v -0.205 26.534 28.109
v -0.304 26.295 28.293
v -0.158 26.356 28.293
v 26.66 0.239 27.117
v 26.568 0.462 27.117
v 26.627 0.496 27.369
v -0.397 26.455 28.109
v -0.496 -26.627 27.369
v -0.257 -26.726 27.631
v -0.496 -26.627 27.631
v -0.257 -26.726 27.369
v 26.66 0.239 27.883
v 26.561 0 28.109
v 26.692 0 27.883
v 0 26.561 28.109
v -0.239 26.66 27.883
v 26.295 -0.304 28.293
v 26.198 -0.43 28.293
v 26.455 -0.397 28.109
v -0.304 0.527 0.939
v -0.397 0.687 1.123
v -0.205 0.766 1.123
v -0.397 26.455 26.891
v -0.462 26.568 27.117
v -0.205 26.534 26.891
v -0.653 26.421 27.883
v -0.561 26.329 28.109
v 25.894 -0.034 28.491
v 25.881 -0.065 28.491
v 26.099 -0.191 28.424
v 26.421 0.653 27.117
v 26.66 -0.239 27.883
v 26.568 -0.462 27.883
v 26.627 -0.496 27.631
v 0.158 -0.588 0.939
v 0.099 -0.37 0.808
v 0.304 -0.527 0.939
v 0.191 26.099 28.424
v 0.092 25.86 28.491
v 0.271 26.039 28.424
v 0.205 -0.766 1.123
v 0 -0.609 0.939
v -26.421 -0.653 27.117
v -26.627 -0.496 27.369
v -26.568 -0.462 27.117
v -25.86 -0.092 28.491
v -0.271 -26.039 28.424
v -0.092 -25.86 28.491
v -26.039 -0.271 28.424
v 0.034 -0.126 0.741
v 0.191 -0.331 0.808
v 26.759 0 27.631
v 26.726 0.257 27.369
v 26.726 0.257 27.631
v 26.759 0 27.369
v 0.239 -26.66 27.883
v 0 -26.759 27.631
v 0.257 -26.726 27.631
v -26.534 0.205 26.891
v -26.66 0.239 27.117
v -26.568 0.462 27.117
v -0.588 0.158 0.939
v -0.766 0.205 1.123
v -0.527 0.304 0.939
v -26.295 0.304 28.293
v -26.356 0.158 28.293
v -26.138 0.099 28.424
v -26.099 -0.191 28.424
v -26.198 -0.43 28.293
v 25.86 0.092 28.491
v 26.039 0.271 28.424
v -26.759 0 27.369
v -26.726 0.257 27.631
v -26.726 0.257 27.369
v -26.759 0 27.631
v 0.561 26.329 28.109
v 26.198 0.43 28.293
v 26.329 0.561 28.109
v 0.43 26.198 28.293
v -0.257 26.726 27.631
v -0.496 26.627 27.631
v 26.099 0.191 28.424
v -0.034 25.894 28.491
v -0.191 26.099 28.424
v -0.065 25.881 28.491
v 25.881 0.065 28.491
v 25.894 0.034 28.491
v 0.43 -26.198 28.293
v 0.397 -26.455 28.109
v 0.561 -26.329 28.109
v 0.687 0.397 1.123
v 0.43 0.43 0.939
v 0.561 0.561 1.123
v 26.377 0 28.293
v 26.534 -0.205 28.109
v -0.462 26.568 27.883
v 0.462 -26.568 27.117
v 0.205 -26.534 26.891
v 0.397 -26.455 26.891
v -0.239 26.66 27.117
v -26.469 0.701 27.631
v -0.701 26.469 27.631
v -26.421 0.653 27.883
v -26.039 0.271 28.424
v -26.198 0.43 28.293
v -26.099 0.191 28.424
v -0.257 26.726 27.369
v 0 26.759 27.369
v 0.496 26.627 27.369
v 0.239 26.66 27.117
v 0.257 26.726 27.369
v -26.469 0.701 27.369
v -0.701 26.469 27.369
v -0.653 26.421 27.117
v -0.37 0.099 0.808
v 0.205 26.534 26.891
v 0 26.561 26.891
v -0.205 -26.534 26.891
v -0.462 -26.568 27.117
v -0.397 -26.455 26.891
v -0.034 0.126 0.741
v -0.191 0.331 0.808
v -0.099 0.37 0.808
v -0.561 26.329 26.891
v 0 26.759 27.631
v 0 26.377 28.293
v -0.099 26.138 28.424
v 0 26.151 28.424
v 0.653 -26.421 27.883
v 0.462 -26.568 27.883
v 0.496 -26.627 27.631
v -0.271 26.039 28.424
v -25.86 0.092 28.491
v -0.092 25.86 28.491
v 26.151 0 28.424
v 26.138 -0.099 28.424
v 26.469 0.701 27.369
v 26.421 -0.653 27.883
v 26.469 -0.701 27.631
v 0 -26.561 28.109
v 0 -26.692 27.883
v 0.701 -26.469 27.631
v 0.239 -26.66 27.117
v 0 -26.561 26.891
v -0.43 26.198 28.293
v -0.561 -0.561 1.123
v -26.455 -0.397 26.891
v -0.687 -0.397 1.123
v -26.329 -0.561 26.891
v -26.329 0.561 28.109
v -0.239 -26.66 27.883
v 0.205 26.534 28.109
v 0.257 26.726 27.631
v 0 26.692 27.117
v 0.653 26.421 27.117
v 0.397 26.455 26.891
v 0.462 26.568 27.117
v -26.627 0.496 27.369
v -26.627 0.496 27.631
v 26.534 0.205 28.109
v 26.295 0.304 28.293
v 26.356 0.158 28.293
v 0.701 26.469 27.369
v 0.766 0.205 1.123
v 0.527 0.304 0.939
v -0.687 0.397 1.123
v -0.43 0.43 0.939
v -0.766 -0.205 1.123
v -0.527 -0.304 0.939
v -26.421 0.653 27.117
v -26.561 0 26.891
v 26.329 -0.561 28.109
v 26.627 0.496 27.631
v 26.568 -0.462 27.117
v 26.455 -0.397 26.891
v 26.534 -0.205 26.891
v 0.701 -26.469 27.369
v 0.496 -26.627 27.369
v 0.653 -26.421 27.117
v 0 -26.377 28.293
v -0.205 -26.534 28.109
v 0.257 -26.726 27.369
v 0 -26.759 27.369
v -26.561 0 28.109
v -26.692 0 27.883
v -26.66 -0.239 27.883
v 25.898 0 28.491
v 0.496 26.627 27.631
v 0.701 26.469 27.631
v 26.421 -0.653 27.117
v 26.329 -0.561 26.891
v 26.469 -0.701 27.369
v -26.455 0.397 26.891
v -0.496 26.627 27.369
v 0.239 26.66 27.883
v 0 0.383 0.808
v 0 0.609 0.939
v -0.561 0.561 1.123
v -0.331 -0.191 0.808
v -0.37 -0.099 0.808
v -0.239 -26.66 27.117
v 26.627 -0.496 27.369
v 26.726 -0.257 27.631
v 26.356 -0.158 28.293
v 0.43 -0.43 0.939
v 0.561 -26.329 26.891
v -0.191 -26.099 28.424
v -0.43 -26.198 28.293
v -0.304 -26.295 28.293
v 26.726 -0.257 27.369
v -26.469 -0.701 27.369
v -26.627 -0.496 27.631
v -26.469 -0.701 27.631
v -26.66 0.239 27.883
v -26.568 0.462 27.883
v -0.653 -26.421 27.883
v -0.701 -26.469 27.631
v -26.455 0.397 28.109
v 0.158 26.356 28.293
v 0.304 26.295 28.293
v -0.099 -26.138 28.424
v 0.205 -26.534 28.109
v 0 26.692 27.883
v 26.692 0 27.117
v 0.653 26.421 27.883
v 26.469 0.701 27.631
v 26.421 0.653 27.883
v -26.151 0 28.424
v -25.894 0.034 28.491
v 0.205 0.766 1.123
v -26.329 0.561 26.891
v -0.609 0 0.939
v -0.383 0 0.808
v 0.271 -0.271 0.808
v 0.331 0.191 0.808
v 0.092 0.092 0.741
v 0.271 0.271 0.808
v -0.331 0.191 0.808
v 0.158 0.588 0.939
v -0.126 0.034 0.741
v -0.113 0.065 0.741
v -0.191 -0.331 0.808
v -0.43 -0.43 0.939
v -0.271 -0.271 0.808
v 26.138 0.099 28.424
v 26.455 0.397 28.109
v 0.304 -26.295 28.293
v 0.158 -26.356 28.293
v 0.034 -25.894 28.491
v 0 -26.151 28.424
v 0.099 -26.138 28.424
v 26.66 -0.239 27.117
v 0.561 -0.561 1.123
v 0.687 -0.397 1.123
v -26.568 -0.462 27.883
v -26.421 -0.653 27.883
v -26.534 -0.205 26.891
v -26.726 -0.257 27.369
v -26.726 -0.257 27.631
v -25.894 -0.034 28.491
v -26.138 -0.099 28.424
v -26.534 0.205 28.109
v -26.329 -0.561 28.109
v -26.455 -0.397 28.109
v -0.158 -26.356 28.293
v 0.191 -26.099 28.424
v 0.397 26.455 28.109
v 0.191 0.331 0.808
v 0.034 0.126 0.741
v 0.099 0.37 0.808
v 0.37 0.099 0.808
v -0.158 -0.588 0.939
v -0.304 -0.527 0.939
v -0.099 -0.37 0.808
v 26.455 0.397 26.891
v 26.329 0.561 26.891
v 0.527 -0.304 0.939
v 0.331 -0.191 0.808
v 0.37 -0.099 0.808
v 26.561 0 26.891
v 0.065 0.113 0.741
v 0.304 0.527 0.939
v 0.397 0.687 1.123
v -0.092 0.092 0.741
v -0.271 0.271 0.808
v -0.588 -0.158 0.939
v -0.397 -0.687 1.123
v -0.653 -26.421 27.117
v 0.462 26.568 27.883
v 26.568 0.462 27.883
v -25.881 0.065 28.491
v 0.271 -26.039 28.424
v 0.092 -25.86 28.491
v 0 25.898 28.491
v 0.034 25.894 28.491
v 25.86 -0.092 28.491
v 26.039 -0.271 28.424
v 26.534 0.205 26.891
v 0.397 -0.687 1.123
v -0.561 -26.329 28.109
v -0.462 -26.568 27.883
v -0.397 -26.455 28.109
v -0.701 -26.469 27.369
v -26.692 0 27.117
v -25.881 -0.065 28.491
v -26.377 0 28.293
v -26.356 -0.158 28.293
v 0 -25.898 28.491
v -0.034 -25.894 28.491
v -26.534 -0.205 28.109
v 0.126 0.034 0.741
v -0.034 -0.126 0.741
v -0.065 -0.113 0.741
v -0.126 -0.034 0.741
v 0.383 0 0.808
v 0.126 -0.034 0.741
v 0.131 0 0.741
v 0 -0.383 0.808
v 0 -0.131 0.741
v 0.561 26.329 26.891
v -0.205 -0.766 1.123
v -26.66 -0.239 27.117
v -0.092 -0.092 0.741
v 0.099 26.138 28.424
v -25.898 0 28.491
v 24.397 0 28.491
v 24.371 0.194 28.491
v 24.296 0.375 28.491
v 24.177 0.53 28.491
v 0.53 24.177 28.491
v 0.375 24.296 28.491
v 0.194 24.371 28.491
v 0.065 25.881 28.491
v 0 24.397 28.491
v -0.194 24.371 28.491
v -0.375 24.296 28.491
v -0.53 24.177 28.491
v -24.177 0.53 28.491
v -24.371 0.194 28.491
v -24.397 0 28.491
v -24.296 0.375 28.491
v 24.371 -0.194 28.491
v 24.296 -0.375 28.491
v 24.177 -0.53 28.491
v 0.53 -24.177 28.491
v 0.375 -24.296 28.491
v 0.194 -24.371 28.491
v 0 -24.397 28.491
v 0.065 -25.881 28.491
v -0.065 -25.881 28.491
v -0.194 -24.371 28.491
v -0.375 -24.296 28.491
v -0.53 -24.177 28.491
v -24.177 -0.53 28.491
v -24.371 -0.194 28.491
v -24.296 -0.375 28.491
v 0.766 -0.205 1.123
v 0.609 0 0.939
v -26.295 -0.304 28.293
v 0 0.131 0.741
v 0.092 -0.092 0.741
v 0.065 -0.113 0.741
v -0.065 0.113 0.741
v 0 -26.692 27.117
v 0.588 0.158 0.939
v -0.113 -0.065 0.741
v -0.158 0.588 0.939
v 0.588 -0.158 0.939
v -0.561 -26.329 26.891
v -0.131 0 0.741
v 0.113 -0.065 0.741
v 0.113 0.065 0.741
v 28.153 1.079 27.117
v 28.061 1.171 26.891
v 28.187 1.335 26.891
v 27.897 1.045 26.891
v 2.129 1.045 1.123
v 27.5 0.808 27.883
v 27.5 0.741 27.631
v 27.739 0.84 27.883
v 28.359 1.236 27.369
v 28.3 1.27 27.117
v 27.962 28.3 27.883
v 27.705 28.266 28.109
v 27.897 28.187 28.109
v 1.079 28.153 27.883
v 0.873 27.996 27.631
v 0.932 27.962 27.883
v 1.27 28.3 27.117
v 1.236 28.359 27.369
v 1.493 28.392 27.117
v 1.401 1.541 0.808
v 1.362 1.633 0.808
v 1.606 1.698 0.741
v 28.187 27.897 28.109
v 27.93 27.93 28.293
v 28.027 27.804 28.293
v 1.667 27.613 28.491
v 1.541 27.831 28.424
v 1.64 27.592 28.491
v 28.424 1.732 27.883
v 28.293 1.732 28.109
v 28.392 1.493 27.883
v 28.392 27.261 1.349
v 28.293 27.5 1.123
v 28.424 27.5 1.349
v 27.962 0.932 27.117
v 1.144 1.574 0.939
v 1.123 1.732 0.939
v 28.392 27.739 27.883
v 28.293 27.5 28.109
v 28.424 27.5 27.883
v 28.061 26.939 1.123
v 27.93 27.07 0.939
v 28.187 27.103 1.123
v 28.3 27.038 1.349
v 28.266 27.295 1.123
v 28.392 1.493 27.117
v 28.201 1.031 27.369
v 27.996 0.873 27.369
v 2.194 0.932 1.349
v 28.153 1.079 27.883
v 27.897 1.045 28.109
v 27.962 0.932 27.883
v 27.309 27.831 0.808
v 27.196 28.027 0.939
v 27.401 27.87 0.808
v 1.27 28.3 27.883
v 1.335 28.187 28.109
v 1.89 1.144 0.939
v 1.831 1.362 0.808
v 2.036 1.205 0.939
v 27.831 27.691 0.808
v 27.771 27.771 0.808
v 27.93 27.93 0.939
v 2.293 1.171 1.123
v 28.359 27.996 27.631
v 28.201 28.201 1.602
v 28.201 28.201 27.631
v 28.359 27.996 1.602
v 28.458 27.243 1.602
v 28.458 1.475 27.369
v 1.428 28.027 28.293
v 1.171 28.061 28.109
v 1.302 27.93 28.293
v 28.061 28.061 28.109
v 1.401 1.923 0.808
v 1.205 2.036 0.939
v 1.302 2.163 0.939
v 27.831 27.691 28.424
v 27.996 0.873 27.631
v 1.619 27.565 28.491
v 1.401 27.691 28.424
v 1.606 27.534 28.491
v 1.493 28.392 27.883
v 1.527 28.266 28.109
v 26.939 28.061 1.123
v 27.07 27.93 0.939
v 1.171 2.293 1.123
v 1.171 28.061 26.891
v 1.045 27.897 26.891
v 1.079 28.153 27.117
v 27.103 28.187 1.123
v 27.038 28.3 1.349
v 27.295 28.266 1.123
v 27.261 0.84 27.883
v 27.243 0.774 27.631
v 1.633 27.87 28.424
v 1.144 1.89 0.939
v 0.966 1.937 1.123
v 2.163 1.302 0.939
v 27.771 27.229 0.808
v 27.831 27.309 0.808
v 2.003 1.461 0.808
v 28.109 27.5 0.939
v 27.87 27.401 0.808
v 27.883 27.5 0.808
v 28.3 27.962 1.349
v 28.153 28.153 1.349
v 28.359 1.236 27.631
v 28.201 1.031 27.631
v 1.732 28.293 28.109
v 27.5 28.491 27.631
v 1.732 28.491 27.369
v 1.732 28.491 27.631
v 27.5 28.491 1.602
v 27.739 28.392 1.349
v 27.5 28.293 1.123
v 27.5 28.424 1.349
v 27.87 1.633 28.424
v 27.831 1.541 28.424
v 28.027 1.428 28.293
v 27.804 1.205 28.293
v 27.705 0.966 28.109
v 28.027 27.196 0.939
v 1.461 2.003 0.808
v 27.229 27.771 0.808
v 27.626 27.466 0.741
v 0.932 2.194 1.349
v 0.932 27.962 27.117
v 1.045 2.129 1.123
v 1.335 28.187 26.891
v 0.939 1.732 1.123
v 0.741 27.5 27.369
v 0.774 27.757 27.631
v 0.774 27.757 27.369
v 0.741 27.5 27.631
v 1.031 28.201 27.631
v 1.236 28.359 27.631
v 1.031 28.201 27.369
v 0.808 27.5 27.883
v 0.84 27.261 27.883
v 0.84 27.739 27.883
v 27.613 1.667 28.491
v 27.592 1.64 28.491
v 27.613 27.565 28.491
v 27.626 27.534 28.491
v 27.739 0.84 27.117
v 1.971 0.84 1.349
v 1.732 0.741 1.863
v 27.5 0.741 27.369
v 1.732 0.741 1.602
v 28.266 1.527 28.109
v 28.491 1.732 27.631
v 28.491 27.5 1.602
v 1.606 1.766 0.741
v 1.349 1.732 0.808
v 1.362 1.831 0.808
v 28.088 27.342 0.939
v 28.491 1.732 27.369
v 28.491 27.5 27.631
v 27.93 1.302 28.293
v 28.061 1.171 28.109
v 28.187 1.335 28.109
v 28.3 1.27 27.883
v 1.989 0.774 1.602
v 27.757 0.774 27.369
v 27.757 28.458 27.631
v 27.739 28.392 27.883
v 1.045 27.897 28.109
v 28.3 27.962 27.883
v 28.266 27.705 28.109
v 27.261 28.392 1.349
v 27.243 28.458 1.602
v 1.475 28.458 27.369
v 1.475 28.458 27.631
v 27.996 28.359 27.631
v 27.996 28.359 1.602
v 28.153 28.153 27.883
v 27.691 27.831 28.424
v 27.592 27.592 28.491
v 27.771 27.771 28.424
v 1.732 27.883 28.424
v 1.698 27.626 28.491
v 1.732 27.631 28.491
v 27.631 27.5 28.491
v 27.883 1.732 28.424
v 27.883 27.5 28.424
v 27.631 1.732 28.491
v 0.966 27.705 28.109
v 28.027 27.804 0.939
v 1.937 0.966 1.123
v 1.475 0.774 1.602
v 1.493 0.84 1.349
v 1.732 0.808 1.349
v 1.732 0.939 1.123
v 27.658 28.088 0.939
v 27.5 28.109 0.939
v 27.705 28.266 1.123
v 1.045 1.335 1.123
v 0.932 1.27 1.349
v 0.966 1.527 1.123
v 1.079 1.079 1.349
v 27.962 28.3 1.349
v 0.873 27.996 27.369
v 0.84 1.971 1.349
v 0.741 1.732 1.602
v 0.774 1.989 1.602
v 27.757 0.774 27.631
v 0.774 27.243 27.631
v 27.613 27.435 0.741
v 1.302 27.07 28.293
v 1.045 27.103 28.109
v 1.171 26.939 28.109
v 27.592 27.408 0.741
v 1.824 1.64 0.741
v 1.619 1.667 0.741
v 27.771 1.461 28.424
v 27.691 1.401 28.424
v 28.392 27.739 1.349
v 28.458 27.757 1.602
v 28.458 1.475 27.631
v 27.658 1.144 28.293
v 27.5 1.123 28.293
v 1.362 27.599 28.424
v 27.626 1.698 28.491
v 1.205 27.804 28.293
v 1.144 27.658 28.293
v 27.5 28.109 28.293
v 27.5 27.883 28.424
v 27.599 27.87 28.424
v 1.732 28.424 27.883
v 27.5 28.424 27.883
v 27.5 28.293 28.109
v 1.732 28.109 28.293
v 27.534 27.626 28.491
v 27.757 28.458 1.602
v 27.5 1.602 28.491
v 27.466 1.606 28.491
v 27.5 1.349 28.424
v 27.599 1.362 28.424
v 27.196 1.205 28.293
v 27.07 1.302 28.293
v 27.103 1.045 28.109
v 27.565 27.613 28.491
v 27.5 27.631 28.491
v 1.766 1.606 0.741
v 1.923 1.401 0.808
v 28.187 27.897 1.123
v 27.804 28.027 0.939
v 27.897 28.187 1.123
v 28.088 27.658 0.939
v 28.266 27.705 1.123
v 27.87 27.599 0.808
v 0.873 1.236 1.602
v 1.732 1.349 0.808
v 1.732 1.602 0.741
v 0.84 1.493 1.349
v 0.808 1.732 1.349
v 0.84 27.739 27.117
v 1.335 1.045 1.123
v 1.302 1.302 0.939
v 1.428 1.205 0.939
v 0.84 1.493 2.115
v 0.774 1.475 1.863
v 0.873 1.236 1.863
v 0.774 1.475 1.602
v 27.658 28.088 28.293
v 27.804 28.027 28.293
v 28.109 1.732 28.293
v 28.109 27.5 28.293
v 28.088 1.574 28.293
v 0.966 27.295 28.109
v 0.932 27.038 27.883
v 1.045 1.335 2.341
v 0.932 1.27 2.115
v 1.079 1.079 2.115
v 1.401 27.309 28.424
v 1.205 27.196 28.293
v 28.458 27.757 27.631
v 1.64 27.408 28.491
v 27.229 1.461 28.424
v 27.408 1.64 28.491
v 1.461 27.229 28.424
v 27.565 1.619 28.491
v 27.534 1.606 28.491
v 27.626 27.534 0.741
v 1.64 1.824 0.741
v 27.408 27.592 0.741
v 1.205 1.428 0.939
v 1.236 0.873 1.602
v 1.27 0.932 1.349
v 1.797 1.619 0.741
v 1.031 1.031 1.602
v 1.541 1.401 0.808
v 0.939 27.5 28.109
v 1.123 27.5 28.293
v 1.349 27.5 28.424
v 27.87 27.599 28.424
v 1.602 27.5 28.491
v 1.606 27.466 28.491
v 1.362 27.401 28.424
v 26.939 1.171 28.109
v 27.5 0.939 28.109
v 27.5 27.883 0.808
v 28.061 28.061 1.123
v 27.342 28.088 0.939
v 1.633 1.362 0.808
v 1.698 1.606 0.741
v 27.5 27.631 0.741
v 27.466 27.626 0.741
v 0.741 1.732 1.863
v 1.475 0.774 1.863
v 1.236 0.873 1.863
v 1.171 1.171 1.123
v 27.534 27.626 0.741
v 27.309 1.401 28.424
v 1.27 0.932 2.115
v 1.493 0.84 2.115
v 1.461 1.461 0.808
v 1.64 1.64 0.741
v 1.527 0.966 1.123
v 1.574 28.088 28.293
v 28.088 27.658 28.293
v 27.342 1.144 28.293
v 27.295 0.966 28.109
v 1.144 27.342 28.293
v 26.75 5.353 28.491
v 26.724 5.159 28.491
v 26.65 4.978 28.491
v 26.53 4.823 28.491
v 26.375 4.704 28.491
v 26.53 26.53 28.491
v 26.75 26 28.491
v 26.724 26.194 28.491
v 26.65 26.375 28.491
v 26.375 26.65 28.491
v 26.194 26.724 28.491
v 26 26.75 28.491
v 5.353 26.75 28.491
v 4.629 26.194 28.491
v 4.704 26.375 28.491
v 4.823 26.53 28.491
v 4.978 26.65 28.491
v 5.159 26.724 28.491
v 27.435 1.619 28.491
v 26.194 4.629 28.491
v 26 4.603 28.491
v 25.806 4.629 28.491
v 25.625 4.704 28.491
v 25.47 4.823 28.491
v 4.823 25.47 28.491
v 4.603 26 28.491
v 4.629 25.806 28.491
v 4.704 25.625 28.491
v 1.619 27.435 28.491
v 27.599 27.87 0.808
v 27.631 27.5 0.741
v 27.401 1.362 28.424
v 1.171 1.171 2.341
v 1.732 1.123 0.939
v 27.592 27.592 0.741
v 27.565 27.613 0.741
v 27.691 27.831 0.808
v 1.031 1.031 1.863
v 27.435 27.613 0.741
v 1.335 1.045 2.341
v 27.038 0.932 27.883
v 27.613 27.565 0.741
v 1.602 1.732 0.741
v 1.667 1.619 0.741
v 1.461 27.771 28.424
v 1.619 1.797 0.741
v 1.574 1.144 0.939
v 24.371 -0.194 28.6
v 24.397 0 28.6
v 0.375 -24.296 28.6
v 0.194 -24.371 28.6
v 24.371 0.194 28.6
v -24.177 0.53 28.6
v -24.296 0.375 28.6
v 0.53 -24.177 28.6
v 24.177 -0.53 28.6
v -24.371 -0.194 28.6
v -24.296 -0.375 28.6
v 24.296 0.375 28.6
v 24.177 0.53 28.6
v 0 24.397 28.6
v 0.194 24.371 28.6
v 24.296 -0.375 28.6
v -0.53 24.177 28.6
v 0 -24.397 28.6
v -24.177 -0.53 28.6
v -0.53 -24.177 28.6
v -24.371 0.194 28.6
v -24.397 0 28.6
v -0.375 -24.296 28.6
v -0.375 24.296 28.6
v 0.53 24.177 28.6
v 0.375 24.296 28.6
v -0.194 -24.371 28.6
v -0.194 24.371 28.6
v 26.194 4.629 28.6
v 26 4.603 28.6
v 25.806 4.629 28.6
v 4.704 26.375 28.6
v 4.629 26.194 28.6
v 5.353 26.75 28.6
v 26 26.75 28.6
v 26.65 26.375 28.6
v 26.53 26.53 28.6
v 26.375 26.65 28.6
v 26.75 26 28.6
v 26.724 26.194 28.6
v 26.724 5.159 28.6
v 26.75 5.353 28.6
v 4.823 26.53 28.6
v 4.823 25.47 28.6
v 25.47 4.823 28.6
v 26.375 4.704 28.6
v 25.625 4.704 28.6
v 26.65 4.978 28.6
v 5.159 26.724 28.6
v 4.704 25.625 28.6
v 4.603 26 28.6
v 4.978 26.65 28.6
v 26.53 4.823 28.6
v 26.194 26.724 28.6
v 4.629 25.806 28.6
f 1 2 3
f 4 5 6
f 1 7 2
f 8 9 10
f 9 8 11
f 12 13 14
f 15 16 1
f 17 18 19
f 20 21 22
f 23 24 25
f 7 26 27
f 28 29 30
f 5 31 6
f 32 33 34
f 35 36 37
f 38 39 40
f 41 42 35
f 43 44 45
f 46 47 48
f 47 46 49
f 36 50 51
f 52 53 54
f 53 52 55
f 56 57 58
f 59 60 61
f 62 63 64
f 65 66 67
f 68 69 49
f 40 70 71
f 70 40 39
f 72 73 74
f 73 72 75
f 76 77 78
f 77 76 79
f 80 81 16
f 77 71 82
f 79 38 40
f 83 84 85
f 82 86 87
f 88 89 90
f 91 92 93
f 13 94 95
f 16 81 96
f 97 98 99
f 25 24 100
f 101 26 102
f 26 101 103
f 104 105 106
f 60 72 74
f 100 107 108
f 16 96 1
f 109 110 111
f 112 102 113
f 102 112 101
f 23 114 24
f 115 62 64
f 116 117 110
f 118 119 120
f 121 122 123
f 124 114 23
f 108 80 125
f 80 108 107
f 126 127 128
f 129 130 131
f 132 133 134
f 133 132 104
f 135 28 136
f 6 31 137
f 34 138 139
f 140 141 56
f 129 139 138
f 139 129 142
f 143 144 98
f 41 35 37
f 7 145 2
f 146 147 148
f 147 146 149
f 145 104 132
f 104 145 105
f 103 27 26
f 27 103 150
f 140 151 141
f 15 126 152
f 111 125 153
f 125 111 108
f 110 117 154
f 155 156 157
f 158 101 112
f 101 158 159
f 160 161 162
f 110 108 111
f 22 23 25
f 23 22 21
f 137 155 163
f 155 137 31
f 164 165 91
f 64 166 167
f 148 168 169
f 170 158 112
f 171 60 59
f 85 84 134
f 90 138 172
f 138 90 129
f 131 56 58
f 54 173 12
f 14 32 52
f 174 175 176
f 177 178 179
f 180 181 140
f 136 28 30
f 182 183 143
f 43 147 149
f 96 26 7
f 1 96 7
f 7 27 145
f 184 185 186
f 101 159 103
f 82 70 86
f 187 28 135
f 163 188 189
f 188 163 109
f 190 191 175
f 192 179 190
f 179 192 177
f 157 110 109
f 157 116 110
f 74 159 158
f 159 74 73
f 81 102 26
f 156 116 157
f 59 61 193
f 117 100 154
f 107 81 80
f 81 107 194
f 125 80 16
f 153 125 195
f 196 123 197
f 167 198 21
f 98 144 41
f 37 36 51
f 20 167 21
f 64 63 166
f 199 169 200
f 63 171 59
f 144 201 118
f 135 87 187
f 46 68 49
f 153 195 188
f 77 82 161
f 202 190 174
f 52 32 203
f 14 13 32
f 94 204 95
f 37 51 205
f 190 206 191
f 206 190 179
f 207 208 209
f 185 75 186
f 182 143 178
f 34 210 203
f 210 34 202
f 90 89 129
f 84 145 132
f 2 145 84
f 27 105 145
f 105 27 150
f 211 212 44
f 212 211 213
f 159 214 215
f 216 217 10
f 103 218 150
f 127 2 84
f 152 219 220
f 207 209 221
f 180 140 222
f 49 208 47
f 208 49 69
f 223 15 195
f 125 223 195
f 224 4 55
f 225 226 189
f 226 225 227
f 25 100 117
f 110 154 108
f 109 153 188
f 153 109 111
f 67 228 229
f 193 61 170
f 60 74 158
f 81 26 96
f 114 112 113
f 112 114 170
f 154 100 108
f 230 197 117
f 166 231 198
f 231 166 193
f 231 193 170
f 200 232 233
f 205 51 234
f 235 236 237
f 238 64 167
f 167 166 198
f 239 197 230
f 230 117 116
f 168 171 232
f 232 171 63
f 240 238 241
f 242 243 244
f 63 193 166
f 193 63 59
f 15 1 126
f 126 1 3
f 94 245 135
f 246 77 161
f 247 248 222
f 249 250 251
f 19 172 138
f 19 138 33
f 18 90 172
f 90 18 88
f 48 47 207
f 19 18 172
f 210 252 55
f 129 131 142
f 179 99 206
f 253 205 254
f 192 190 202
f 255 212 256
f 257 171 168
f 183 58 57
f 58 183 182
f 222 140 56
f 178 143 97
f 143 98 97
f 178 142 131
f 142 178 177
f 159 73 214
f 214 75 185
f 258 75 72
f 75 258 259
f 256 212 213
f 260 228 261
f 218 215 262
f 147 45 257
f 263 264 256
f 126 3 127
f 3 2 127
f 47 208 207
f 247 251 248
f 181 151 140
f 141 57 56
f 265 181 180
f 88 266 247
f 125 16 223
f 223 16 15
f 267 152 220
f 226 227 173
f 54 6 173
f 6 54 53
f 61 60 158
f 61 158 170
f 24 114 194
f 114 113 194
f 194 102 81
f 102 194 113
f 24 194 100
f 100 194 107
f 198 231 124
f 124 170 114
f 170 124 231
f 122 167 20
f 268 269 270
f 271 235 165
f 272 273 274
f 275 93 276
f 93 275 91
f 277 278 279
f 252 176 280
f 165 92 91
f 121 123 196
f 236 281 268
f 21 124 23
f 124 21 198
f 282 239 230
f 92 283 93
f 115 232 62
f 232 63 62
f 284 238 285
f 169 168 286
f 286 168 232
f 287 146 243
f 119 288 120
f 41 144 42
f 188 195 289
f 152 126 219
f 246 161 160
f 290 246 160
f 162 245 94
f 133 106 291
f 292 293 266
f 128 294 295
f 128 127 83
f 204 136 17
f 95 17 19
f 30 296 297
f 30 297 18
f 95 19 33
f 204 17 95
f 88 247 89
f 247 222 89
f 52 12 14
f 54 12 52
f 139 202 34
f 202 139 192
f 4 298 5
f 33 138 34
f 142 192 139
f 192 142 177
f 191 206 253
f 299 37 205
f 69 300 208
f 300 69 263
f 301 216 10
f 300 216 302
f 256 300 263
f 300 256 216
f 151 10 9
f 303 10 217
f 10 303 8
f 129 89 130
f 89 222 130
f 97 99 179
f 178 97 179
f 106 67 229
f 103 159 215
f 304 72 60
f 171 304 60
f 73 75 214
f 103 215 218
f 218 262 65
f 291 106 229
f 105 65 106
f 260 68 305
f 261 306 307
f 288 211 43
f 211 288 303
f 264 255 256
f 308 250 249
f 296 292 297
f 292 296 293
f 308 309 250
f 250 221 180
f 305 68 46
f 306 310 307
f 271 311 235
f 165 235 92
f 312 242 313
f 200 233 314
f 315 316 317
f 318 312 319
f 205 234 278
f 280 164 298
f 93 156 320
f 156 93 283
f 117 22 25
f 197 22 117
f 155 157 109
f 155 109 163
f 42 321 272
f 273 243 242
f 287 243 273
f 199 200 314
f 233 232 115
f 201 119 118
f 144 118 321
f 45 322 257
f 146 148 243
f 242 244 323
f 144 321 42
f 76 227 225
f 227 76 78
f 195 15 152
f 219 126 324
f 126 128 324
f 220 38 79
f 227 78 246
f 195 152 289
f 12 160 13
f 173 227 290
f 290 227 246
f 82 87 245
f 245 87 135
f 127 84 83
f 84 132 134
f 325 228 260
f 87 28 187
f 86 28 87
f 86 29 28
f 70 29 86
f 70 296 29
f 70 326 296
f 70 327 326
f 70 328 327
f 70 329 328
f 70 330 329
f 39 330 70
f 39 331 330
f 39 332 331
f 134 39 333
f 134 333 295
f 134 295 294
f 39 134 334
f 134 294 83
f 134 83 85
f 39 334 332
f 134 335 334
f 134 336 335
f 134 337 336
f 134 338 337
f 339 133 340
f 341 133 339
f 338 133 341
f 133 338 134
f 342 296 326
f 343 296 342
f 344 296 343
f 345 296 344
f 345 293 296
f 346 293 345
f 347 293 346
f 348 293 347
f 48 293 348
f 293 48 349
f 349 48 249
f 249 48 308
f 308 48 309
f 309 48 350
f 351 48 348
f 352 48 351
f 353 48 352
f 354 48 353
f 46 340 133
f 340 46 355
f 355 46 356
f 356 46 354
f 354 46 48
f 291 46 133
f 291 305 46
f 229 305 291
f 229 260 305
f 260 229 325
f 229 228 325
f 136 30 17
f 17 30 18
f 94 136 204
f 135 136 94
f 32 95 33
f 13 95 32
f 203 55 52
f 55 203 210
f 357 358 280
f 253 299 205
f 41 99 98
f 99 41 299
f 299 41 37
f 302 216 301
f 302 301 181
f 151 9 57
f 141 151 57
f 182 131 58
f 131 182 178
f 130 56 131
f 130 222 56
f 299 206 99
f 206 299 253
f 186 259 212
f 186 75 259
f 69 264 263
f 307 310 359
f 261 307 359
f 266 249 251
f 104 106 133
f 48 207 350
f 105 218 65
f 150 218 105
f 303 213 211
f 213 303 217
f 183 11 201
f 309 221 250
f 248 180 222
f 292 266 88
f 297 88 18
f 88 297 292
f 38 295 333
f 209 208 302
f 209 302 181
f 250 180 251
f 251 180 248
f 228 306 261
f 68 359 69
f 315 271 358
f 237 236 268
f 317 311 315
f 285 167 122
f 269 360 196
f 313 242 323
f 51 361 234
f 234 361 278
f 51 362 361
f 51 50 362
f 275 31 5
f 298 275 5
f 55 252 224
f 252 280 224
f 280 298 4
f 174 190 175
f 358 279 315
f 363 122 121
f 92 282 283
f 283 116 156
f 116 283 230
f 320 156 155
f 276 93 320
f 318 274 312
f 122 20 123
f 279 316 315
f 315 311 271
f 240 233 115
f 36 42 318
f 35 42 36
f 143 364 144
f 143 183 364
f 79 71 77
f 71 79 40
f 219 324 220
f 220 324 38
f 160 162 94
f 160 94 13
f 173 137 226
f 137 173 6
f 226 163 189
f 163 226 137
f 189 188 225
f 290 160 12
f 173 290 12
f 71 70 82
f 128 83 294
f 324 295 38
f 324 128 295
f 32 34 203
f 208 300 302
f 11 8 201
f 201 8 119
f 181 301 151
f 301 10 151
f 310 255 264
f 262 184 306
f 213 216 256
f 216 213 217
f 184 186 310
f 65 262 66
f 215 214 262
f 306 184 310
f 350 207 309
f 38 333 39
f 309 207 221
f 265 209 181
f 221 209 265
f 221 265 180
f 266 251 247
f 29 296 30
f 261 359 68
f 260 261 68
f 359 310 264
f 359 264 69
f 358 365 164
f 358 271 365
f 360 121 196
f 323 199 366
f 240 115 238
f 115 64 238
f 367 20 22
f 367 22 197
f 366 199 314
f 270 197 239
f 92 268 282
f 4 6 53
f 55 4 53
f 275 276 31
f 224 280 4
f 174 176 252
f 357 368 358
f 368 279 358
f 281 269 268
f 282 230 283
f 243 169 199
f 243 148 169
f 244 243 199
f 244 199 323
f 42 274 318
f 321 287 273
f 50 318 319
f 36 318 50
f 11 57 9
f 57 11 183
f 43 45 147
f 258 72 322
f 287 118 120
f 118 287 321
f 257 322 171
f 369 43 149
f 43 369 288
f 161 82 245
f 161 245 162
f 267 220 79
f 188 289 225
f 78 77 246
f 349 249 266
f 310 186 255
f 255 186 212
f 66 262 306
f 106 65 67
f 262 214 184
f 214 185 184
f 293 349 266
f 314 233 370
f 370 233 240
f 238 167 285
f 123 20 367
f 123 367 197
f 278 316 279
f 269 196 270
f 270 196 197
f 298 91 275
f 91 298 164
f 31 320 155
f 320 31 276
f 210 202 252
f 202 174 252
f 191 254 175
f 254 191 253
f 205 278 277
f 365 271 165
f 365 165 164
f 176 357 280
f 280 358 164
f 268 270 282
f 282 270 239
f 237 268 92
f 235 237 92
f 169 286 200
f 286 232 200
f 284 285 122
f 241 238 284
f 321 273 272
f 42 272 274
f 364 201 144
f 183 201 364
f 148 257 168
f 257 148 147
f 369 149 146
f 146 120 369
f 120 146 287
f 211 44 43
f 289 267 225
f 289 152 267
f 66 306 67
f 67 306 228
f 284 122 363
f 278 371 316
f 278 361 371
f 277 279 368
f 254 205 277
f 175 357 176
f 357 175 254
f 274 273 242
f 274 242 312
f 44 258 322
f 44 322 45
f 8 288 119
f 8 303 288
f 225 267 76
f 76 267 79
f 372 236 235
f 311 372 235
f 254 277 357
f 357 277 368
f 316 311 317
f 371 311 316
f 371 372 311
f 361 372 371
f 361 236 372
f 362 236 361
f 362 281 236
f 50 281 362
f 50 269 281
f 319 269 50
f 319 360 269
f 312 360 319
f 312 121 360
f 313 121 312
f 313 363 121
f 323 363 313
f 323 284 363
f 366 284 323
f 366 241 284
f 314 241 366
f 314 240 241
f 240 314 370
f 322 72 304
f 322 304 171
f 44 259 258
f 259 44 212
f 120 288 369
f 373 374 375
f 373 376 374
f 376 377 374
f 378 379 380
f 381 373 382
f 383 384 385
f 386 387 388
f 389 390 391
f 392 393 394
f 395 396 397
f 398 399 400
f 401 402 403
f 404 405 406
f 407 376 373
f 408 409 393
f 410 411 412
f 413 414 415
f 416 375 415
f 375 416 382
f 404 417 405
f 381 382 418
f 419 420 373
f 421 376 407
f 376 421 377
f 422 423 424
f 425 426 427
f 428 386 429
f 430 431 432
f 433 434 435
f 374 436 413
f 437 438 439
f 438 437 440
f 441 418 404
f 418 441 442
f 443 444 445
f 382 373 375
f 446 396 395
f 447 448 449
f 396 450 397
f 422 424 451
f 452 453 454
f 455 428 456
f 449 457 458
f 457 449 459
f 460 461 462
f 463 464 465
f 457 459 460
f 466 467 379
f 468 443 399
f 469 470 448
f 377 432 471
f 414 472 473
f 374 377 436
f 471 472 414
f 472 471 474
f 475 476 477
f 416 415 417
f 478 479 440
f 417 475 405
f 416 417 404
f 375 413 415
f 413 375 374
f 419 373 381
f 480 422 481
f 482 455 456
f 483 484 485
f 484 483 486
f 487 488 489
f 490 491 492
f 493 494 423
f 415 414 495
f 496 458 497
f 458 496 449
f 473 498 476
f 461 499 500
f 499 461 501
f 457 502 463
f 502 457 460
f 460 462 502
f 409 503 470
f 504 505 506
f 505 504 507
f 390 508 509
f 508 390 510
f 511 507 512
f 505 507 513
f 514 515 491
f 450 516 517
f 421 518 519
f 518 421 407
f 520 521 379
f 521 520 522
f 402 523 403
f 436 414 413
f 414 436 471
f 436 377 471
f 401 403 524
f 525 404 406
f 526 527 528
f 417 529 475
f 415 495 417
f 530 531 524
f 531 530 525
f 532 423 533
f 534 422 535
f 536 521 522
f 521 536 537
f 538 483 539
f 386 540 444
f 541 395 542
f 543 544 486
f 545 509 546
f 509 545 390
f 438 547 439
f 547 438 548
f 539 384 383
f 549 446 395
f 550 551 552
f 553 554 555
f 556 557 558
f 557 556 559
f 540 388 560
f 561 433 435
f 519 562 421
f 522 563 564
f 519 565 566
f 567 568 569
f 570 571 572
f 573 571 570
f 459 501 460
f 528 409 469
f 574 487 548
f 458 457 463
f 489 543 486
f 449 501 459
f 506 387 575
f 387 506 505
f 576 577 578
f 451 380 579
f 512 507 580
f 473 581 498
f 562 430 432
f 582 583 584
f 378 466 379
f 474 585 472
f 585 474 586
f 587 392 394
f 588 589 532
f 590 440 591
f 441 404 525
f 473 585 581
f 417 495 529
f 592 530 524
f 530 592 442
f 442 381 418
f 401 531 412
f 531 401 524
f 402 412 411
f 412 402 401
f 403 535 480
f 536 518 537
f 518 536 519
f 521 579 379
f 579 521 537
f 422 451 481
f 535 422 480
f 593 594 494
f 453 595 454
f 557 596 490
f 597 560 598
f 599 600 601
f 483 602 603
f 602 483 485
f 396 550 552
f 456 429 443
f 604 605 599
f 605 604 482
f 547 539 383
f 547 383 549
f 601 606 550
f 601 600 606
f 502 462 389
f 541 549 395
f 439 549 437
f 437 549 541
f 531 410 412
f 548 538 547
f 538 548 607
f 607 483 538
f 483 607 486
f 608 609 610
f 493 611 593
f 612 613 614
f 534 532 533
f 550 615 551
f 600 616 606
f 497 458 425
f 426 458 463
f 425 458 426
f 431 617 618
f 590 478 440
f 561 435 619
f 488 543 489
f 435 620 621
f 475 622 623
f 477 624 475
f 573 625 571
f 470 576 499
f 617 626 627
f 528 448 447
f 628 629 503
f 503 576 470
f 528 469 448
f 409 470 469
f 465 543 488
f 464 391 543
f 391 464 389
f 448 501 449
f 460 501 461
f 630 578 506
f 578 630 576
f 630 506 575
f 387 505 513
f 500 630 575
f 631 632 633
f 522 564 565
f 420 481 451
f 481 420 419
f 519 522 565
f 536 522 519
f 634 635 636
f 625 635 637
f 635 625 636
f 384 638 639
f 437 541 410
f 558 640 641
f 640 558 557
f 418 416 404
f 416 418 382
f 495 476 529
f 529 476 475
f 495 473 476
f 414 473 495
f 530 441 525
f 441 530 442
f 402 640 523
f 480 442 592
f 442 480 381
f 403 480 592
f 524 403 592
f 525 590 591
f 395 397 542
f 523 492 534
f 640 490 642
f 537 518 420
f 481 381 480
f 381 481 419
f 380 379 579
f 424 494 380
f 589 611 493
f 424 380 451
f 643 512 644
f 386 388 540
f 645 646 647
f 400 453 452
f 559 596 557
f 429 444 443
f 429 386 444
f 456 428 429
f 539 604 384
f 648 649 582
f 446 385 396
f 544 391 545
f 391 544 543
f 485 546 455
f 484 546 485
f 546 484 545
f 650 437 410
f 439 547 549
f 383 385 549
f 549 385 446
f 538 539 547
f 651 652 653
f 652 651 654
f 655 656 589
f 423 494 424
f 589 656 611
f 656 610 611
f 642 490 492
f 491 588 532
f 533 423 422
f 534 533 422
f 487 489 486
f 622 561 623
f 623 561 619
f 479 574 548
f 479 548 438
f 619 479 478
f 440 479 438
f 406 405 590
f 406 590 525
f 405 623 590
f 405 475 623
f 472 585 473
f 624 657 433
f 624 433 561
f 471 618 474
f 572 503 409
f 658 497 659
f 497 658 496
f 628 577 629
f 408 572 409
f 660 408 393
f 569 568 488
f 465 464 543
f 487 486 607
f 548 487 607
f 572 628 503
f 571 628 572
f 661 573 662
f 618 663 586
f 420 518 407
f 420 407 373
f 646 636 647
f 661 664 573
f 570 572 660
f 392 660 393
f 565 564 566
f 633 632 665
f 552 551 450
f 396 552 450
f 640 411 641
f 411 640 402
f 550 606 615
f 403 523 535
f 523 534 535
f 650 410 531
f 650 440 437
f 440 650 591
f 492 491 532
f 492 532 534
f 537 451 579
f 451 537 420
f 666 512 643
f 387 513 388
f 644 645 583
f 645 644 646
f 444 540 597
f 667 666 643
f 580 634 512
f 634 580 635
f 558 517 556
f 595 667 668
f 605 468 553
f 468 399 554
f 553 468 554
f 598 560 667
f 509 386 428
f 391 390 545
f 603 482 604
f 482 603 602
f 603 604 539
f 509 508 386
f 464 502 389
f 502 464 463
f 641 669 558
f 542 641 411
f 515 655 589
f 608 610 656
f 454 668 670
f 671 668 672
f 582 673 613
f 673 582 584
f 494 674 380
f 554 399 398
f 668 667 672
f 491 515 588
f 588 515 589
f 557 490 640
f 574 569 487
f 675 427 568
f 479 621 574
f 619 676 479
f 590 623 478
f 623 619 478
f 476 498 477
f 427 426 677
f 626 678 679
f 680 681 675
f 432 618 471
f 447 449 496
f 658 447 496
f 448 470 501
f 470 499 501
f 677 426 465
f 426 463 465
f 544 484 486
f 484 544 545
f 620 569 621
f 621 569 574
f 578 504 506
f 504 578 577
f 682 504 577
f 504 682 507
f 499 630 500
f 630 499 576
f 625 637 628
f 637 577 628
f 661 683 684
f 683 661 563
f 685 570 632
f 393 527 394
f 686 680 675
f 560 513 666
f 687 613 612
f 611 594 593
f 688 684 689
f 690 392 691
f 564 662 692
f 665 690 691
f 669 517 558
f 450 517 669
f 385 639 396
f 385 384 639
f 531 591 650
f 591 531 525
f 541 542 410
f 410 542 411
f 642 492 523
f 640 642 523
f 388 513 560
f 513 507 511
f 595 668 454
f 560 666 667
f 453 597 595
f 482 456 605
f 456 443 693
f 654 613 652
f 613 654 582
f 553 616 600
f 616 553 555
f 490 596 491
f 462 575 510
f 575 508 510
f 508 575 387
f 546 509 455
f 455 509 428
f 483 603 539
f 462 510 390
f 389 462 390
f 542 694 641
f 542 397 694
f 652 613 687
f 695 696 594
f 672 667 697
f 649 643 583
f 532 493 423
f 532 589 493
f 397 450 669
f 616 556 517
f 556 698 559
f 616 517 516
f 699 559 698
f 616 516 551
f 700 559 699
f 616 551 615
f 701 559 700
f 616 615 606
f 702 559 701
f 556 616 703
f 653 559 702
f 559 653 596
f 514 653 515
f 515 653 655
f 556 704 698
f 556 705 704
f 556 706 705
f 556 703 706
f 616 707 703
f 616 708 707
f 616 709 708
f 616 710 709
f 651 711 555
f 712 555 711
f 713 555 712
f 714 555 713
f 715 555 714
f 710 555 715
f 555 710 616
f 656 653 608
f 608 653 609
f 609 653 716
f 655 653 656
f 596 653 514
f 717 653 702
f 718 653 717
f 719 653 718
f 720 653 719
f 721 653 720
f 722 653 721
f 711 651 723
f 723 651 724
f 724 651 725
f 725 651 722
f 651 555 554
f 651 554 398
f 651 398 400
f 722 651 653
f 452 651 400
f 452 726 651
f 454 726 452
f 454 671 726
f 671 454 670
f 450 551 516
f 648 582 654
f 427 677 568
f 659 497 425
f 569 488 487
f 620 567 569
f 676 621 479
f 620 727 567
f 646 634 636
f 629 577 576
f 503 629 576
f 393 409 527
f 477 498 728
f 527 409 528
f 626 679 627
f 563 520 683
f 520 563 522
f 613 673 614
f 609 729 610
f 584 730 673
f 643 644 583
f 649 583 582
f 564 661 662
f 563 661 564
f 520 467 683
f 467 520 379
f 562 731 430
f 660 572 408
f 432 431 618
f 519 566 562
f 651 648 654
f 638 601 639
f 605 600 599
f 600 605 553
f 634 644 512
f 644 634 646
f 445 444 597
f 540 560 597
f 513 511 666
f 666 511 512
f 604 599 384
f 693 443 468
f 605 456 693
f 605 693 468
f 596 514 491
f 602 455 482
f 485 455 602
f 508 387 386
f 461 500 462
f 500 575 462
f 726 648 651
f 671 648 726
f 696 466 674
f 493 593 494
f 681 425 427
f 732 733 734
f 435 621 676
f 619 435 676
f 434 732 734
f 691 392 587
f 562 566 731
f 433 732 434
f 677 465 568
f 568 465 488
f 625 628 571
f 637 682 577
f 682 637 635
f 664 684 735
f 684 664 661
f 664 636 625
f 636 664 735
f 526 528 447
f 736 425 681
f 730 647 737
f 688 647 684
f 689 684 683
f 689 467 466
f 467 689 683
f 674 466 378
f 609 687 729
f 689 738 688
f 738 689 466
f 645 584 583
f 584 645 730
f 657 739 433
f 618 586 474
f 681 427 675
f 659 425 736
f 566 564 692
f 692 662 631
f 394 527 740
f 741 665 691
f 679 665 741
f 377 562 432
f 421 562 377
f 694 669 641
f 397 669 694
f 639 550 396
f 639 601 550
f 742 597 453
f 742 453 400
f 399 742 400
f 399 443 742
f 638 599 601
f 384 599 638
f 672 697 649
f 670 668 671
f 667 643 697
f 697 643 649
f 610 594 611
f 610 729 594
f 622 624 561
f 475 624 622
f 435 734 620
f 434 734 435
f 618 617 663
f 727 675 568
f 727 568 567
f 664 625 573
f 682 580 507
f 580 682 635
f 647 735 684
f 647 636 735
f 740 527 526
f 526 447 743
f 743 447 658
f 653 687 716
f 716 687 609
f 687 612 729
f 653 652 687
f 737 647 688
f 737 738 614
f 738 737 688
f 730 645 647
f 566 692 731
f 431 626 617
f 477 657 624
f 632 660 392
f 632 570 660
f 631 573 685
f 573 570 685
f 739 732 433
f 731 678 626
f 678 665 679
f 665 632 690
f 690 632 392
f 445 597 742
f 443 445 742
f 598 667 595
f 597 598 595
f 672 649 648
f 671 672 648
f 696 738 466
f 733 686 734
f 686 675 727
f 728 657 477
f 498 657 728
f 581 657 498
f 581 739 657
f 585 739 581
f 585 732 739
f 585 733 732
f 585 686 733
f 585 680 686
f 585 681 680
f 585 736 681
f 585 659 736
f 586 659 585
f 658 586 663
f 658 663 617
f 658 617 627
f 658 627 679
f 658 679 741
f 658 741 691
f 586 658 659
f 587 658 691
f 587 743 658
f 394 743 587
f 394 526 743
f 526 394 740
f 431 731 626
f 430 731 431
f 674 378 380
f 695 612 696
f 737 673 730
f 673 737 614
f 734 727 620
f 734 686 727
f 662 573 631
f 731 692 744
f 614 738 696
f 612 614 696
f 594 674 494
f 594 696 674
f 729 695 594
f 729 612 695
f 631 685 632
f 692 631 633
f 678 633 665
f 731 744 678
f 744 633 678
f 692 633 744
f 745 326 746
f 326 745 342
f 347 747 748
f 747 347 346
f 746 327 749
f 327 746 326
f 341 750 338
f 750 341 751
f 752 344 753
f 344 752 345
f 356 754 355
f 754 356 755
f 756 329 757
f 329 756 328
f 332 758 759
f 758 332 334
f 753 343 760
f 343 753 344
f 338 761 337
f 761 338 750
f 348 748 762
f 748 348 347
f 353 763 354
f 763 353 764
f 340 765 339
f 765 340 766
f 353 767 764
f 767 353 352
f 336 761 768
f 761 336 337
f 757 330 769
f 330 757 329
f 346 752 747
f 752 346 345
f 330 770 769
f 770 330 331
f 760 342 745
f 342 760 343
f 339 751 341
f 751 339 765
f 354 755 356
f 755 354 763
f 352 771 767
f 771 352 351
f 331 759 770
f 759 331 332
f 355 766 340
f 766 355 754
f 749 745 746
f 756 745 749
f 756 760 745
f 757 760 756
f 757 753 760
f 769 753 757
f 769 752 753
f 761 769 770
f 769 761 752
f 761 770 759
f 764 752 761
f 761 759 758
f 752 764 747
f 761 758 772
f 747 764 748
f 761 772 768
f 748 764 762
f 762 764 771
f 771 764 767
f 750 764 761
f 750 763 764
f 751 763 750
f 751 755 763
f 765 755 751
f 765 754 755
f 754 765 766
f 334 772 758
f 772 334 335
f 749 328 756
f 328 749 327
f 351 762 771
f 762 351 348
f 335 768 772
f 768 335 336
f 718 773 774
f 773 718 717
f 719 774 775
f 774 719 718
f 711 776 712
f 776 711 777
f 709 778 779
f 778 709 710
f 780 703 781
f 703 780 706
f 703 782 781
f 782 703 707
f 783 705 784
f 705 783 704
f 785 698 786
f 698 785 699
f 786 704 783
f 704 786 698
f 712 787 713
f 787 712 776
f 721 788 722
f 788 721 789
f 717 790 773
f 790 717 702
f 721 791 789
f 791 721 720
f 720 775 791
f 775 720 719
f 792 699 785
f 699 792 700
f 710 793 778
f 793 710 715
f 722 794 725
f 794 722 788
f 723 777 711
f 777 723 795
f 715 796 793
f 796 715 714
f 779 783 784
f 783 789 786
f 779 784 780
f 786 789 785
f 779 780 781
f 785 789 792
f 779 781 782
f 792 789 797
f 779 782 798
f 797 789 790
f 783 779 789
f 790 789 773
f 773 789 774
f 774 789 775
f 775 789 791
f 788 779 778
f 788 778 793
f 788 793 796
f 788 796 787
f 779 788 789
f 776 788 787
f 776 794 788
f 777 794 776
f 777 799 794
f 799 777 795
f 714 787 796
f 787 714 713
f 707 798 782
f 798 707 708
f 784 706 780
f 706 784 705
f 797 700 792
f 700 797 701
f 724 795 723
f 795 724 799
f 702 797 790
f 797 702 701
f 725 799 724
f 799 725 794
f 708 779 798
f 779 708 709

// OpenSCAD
// file: def.scad
total_size = 57;

round_radius = 1;
sticker_margin = 2.5;
sticker_round_radius = 0.75;
inf = total_size * 10;

theta = atan(sqrt(2));

cut1_rot = [-theta, 0, -45];
sticker_dif_cut1_dis = total_size / 2 / tan(theta) - round_radius / tan(theta / 2) + round_radius - sticker_margin;
sticker_int_cut1_dis = total_size / 2 / tan(theta) + round_radius * tan(theta / 2) - round_radius + sticker_margin;

module _cube() {
    cube([total_size - round_radius * 2, total_size - round_radius * 2, total_size - round_radius * 2], center = true);
}

module _cut1() {
    translate([-inf, -inf, 0])
        cube([inf * 2, inf * 2, inf]);
}

module _int_cut1() {
    translate([-inf, -inf, round_radius])
        cube([inf * 2, inf * 2, inf]);
}

module _sticker_int_cut1() {
    rotate([-90, 0, 0])
        translate([-inf, -inf, sticker_int_cut1_dis])
            cube([inf * 2, inf * 2, inf]);
}

module _sticker_dif_cut1() {
    rotate([-90, 0, 0])
        translate([-inf, -inf, sticker_dif_cut1_dis])
            cube([inf * 2, inf * 2, inf]);
}

module _sticker_base() {
    translate([0, 0, total_size / 2])
        cube([total_size - sticker_margin * 2, total_size - sticker_margin * 2, 0.1], center = true);
}
// file: corner_sticker.scad
include <def.scad>

module corner_sticker() {
    minkowski() {
        intersection() {
            _sticker_base();
            rotate([0, 0, -45])
                _sticker_int_cut1();
        }
        cylinder(r = sticker_round_radius, h = 0.1, center = true, $fn = 24);
    }
}

corner_sticker();
// file: center_sticker.scad
include <def.scad>

module center_sticker() {
    minkowski() {
        difference() {
            _sticker_base();
            for (deg = [45 : 90 : 315])
                rotate([0, 0, deg])
                    _sticker_dif_cut1();
        }
        cylinder(r = sticker_round_radius, h = 0.1, center = true, $fn = 24);
    }
}

center_sticker();
// file: corner_block.scad
include <def.scad>

module corner_block() {
    minkowski() {
        intersection() {
            _cube();
            intersection_for(vec = [[90, 0, 0], [-90, 0, 0], [0, -90, 0]])
                rotate(vec)
                    rotate(cut1_rot)
                        _int_cut1();
        }
        sphere(r = round_radius, $fn = 24);
    }
}

corner_block();
// file: center_block.scad
include <def.scad>

module center_block() {
    minkowski() {
        intersection() {
            _cube();
            intersection_for(deg = [0 : 90 : 270])
                rotate([0, 0, deg])
                    rotate(cut1_rot)
                        _int_cut1();
        }
        sphere(r = round_radius, $fn = 24);
    }
}

center_block();
// main file
use <center_block.scad>
use <corner_block.scad>
use <center_sticker.scad>
use <corner_sticker.scad>

color([0.5, 0.5, 0.5]) {
    center_block();
    corner_block();
}

color([0.9, 0.9, 0.9]) {
    center_sticker();
    corner_sticker();
}
